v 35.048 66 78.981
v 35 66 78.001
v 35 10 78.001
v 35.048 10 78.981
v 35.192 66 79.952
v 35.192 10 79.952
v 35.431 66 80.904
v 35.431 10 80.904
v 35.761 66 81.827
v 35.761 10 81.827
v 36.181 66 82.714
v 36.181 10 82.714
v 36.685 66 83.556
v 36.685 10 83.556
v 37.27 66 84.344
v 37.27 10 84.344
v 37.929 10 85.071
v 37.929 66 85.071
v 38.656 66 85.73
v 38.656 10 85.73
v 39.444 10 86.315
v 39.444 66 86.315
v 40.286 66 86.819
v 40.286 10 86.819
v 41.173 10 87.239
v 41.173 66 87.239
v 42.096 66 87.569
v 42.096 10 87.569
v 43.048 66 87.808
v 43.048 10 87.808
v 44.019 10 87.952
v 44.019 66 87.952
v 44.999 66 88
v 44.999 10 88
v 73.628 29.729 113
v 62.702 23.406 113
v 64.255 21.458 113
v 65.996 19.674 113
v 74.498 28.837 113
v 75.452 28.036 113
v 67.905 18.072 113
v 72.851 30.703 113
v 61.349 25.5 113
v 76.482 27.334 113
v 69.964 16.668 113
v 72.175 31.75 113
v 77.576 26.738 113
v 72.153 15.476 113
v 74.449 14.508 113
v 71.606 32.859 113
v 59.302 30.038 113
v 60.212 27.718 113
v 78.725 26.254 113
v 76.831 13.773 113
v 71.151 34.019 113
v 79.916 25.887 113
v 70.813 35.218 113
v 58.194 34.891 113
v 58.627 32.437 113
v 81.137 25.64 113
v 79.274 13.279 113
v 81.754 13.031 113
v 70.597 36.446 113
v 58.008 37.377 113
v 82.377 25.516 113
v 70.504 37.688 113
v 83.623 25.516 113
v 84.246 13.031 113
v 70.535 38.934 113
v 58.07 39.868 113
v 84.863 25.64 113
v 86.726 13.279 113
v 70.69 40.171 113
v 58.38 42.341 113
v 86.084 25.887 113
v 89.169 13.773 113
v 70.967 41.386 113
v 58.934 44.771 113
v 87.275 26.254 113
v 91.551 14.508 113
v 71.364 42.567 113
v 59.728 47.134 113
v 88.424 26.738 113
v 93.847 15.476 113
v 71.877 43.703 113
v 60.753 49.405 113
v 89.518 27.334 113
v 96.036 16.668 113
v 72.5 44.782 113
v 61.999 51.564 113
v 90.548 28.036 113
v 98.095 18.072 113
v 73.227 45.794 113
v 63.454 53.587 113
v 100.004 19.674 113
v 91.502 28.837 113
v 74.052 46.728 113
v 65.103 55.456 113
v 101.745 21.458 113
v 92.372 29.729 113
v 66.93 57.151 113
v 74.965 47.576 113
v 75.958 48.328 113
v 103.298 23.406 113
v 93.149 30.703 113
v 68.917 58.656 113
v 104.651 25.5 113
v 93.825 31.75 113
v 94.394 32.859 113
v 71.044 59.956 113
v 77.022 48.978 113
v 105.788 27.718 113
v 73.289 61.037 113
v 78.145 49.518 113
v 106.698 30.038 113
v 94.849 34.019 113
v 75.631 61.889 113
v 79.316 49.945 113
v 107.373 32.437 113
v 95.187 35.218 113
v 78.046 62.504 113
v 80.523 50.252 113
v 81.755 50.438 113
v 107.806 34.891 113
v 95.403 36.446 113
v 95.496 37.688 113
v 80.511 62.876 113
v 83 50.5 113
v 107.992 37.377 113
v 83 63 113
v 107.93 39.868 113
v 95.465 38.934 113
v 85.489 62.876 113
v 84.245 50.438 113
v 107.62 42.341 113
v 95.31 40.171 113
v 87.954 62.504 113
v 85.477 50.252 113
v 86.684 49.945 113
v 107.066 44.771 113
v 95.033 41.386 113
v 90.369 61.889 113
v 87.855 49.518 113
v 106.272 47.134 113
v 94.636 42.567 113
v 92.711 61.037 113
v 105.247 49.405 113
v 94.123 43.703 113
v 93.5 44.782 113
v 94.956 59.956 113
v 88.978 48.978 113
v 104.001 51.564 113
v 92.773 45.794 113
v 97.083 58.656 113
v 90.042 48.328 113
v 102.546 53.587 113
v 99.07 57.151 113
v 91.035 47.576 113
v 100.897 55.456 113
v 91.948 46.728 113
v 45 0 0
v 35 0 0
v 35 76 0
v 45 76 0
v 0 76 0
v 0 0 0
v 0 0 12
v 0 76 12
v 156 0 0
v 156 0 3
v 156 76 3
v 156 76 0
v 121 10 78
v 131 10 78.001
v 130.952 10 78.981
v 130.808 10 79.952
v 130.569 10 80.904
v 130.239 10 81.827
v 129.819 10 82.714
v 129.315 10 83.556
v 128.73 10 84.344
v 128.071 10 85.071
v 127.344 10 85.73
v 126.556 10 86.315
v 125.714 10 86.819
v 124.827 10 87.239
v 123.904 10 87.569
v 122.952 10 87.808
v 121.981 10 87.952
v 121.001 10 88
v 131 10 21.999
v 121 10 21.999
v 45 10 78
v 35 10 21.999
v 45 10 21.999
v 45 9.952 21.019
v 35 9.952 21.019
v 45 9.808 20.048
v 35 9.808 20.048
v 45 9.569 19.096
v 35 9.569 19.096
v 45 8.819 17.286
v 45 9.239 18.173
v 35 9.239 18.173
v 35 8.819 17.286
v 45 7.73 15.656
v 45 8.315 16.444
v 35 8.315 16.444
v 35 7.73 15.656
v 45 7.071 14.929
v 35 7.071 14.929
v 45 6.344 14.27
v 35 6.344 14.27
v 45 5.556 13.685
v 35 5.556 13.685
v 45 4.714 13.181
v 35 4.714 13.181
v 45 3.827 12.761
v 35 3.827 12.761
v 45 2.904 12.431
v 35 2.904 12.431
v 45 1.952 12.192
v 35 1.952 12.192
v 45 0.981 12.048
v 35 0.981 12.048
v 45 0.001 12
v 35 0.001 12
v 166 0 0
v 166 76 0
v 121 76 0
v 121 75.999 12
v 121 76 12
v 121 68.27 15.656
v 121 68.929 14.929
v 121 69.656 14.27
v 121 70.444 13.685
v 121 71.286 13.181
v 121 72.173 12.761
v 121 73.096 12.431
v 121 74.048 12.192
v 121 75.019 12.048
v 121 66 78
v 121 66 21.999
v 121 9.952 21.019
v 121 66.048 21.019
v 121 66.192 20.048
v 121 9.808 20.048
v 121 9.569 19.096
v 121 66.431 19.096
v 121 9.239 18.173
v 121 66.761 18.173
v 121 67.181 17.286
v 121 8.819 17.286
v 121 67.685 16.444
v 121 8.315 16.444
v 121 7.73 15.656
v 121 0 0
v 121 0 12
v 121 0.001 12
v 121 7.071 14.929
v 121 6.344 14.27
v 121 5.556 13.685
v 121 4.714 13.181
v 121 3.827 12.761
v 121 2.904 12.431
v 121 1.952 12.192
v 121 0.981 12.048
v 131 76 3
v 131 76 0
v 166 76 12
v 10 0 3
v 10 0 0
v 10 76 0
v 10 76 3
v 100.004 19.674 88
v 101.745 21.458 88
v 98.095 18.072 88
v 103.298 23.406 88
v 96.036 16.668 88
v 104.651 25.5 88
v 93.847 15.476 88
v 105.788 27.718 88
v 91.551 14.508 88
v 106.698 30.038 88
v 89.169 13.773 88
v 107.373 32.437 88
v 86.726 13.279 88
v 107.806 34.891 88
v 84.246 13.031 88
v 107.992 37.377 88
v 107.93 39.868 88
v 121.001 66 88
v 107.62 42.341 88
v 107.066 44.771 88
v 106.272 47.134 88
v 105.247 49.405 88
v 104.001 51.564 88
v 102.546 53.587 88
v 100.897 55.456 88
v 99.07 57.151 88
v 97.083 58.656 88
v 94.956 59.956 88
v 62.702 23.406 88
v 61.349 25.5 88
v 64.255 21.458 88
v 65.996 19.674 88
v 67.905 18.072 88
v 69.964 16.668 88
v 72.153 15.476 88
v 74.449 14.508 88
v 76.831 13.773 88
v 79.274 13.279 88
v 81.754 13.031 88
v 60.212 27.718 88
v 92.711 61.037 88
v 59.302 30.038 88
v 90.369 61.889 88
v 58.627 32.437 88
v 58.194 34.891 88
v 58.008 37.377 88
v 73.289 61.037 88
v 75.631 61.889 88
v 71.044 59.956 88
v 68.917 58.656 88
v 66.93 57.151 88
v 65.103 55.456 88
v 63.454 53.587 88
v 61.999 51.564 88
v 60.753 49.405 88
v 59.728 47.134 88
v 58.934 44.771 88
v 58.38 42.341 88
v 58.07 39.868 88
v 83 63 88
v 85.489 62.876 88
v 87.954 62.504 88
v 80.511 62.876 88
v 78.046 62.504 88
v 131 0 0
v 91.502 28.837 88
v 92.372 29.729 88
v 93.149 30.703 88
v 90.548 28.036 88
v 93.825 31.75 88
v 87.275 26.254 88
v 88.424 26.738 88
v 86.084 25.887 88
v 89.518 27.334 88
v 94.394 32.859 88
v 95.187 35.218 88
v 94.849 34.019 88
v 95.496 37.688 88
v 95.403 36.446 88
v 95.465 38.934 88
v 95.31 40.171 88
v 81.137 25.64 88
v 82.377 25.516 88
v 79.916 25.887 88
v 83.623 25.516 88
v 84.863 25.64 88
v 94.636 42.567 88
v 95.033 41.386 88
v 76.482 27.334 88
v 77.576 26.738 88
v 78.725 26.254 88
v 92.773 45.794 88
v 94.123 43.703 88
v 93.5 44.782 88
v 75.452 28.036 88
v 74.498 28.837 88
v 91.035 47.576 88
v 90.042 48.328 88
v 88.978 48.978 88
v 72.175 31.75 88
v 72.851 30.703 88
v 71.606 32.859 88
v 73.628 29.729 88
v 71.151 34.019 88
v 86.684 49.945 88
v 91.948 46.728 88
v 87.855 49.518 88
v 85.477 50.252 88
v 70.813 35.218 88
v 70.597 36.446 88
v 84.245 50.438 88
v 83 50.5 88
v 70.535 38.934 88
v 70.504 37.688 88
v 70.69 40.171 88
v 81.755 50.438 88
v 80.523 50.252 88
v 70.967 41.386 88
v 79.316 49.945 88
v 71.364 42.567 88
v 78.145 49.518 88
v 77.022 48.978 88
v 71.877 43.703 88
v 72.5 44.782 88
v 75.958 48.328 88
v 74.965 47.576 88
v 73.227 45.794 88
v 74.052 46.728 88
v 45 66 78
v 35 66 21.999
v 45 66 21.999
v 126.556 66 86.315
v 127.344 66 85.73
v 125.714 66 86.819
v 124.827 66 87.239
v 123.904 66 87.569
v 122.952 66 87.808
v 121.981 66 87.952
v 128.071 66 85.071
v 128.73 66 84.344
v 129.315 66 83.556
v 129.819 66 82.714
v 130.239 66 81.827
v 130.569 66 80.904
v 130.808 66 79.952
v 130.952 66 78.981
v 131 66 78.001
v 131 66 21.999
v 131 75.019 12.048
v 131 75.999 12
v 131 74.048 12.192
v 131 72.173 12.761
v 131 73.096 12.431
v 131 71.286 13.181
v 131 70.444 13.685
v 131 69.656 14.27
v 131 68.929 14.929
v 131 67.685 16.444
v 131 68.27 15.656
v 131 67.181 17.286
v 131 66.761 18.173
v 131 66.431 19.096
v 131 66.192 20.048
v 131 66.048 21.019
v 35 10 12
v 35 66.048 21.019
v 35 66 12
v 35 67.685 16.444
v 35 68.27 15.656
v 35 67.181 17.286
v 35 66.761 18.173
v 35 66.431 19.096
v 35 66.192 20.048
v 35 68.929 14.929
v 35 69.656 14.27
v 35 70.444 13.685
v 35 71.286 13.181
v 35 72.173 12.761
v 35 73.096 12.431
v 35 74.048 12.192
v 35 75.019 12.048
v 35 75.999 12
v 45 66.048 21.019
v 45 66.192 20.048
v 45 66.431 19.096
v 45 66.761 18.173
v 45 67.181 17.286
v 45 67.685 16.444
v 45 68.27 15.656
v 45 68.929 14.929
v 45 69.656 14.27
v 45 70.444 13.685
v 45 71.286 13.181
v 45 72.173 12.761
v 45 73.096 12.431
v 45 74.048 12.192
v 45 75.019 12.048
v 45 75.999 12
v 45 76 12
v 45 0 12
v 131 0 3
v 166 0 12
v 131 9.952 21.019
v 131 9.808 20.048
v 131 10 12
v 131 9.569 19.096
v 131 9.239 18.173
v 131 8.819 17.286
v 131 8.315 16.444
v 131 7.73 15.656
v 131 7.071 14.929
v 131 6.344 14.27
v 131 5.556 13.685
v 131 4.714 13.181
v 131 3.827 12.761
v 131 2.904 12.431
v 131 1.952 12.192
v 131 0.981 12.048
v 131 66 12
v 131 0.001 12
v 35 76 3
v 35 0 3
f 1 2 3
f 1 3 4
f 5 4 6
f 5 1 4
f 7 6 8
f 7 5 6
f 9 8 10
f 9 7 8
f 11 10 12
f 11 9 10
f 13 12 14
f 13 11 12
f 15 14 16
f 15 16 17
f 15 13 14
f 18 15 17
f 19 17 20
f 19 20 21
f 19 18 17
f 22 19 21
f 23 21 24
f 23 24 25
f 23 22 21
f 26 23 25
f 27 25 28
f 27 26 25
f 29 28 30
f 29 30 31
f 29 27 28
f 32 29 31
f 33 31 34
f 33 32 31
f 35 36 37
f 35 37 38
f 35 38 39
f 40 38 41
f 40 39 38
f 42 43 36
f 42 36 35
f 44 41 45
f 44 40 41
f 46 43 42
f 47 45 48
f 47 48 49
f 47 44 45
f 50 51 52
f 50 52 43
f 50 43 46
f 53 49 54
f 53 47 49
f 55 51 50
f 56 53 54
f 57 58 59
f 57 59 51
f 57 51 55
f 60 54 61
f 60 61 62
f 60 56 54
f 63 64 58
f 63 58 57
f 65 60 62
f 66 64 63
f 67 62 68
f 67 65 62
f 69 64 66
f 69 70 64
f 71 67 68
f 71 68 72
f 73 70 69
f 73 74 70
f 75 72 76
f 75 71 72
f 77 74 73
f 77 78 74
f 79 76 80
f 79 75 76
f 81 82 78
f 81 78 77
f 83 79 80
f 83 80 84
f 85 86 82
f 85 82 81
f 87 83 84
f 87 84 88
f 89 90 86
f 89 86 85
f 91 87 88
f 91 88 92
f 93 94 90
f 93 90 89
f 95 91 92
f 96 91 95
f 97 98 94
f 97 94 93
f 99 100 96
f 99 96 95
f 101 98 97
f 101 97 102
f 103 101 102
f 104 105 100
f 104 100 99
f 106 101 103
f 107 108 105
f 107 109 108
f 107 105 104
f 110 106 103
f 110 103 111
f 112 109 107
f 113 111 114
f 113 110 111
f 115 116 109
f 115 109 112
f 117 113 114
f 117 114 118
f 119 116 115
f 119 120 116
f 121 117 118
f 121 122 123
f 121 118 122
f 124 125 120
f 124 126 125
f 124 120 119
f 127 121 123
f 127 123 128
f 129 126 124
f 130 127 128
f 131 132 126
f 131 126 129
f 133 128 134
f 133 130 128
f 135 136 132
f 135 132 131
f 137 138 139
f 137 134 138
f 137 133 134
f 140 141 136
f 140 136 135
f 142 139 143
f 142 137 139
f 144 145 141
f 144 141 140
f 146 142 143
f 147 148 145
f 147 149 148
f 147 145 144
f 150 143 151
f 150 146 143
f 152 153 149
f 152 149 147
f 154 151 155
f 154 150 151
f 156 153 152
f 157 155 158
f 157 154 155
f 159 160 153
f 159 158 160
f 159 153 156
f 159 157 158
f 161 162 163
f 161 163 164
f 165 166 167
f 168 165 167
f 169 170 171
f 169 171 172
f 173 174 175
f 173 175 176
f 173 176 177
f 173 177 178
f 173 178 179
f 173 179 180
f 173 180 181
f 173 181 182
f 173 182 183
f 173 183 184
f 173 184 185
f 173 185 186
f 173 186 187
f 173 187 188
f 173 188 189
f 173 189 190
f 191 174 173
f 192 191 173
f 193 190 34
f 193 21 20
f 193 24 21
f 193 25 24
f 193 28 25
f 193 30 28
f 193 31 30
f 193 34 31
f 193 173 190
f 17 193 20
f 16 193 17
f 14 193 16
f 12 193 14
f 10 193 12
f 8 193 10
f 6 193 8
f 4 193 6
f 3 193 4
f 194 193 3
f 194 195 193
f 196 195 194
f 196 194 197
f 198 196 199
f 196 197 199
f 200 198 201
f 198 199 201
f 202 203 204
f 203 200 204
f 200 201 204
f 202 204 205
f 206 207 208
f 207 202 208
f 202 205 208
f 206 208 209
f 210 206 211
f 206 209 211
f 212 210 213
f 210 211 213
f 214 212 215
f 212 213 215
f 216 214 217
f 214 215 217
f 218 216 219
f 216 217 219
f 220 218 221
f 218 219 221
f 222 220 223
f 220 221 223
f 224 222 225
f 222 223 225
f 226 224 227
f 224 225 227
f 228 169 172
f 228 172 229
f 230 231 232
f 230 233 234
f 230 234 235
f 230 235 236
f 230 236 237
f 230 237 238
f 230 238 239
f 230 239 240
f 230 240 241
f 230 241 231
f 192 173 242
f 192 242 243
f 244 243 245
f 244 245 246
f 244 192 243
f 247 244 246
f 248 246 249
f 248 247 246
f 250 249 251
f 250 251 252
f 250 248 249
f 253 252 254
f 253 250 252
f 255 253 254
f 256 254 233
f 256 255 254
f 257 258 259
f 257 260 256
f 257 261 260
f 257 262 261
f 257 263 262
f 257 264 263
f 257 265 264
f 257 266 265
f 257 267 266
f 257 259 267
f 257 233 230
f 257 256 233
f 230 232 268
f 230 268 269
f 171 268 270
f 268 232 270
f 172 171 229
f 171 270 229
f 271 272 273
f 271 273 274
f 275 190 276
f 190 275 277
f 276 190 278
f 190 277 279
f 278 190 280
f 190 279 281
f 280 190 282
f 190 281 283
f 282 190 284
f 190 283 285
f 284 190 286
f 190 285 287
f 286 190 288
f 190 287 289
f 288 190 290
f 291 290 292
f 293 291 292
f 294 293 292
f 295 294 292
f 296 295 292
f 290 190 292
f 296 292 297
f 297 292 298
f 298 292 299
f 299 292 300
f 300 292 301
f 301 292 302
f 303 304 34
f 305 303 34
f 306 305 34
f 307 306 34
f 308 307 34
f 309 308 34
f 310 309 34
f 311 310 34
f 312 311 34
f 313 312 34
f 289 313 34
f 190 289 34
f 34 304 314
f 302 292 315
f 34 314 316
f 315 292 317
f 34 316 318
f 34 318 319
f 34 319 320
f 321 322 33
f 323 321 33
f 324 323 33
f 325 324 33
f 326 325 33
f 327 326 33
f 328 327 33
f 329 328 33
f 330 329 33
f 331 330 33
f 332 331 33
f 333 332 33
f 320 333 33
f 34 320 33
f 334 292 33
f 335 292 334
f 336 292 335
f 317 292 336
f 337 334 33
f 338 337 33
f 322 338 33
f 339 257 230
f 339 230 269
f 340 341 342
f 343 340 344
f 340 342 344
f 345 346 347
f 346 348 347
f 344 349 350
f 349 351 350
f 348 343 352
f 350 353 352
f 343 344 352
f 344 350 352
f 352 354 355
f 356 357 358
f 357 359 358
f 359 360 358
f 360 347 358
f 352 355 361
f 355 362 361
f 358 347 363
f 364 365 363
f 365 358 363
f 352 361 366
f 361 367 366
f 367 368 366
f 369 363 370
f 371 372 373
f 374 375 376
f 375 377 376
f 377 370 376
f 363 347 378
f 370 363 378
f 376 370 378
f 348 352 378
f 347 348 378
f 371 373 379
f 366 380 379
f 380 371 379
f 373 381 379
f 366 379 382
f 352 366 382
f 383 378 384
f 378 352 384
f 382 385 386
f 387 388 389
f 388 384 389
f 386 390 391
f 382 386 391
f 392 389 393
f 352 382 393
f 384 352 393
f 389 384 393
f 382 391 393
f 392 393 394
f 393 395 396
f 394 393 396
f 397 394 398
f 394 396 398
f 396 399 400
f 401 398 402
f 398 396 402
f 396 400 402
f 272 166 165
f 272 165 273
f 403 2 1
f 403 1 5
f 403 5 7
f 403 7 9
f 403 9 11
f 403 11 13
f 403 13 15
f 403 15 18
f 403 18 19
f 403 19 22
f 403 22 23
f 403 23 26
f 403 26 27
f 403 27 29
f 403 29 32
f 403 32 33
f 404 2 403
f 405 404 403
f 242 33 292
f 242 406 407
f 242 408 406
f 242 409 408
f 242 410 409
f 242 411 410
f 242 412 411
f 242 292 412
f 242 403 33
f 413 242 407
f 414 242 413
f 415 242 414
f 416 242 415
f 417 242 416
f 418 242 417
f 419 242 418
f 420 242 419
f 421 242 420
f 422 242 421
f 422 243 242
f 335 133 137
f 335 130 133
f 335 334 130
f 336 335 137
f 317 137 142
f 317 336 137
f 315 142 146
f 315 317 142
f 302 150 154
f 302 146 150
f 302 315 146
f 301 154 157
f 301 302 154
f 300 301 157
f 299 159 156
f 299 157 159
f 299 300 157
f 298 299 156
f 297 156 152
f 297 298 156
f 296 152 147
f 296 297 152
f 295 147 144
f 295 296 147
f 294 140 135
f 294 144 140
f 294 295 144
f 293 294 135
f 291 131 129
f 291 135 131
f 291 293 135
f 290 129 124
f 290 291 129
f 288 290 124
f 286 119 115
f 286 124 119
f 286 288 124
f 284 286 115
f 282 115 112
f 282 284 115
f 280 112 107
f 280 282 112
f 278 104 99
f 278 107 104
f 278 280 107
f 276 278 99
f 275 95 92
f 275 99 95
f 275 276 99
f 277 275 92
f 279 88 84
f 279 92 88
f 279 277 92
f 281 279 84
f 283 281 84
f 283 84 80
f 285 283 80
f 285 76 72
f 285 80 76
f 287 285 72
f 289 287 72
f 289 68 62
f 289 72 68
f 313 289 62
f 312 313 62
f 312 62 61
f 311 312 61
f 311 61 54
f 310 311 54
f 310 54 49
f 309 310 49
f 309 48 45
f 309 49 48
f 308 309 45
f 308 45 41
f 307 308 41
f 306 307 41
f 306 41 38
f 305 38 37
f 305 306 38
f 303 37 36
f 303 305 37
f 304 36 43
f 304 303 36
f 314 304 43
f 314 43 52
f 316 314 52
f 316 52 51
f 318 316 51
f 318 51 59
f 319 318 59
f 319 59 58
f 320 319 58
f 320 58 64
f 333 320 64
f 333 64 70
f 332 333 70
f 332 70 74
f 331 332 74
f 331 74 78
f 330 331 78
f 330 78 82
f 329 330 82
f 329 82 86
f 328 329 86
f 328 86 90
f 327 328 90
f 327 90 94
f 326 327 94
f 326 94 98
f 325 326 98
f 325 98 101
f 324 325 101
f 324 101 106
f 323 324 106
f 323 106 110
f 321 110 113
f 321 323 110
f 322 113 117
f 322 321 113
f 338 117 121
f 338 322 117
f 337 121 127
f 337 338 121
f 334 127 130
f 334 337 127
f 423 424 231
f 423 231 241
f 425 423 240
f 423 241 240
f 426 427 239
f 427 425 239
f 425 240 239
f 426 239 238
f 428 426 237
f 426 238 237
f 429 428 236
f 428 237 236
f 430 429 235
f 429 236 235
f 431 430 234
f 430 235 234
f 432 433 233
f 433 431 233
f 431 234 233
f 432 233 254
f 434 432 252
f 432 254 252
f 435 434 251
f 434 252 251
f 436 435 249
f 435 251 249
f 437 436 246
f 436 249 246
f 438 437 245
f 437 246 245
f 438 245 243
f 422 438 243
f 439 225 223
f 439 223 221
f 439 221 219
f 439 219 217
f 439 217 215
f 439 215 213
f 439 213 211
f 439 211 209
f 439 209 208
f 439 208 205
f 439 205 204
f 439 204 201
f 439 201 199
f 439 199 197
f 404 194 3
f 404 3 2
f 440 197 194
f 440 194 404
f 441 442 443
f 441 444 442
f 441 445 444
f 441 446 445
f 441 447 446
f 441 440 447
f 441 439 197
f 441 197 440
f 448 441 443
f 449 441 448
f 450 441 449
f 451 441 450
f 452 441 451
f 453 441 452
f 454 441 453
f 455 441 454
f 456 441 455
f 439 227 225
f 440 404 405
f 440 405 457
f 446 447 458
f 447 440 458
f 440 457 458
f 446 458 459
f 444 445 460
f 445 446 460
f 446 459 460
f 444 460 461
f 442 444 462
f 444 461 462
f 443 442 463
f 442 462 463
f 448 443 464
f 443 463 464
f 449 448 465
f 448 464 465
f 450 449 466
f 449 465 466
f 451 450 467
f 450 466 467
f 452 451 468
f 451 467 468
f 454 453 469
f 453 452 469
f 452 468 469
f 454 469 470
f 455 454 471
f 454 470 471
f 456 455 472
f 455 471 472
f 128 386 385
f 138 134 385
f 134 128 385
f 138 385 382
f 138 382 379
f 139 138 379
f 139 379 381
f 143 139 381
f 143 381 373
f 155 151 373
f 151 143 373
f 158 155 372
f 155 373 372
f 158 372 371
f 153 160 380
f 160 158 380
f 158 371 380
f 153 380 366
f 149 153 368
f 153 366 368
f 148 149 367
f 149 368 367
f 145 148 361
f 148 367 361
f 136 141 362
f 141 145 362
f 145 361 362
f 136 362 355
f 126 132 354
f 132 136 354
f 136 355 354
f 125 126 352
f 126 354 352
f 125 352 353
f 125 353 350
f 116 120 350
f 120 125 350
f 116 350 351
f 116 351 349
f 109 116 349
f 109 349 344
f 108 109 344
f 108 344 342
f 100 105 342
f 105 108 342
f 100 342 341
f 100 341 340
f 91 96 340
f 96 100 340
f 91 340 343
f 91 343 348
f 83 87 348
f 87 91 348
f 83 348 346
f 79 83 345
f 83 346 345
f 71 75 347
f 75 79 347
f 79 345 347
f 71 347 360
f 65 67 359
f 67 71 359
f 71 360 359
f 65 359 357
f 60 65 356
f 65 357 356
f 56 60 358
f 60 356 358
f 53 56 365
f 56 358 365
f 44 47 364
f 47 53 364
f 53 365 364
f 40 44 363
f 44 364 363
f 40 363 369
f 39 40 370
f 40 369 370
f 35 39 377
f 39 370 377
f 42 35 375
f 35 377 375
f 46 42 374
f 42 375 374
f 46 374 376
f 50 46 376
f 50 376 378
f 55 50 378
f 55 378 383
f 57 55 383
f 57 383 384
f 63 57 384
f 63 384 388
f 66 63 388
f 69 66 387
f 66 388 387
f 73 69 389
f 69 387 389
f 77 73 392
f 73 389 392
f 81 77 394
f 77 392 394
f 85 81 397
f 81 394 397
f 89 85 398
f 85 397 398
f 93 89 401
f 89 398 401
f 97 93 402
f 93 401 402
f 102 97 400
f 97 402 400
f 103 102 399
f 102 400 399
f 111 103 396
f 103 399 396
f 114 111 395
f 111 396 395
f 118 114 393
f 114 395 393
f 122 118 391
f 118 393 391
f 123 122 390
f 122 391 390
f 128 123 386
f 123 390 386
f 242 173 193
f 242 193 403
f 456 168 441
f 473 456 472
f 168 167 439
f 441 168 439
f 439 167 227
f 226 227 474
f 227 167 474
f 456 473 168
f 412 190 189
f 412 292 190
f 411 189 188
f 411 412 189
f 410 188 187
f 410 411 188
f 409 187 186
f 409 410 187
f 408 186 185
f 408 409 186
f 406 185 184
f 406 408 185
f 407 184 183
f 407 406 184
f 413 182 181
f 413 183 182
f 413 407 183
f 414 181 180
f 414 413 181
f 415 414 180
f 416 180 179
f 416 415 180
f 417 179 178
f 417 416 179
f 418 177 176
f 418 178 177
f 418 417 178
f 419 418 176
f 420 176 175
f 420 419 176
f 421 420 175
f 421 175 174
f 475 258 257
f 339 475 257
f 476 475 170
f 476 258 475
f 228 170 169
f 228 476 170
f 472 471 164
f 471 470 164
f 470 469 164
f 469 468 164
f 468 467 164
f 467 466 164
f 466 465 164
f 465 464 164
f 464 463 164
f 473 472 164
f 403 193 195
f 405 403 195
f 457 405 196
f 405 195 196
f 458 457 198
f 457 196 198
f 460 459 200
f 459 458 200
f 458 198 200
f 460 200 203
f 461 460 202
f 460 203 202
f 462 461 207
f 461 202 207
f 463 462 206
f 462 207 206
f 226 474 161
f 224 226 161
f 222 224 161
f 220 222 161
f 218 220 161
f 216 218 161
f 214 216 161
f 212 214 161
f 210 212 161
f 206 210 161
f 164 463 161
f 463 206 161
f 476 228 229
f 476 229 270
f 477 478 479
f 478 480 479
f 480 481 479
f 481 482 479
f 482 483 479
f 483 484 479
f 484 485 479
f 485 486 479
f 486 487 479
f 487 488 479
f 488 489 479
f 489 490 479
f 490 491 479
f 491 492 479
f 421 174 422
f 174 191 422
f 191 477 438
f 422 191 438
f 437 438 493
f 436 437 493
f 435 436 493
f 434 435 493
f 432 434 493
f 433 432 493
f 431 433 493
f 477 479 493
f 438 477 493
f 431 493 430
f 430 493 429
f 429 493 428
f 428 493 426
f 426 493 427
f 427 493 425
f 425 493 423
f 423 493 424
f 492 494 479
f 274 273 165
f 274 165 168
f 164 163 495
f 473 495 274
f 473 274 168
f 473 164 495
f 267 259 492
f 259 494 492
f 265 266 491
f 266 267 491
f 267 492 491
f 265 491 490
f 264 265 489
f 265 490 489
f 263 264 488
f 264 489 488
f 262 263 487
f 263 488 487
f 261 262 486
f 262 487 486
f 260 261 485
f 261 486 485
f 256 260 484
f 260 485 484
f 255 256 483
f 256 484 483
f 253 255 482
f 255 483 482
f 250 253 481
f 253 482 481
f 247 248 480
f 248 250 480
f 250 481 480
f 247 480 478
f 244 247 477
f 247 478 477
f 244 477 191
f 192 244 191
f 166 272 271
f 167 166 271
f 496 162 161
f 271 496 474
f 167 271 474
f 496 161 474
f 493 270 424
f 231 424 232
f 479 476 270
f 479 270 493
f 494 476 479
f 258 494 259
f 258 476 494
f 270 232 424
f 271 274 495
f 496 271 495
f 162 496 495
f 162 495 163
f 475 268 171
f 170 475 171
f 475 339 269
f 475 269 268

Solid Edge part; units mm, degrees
sketch "Sketch1" plane through (0, 0, 0) normal (0, -1, 0) x (1, 0, 0)
  line L0 (0, 12) -> (45, 12)
  line L1 (45, 12) -> (45, 0)
  line L2 (35, 0) -> (45, 0)
  line L3 (35, 3) -> (35, 0)
  line L4 (10, 3) -> (35, 3)
  line L5 (10, 0) -> (10, 3)
  line L6 (0, 0) -> (10, 0)
  line L7 (0, 0) -> (0, 12)
  line L8 (166, 12) -> (121, 12)
  line L9 (121, 12) -> (121, 0)
  line L10 (121, 0) -> (131, 0)
  line L11 (131, 0) -> (131, 3)
  line L12 (131, 3) -> (156, 3)
  line L13 (156, 3) -> (156, 0)
  line L14 (156, 0) -> (166, 0)
  line L15 (166, 0) -> (166, 12)
extrude "Protrusion1" add sketch "Sketch1" against normal blind 76
sketch "Sketch2" plane through (143.5, 38, 12) normal (0, 0, 1) x (1, 0, 0)
  line L0 (-12.5, -28) -> (-12.5, 28)
  line L1 (-12.5, 28) -> (-22.5, 28)
  line L2 (-22.5, 28) -> (-22.5, -28)
  line L3 (-22.5, -28) -> (-12.5, -28)
  line L4 (-108.5, -28) -> (-108.5, 28)
  line L5 (-108.5, 28) -> (-98.5, 28)
  line L6 (-98.5, 28) -> (-98.5, -28)
  line L7 (-98.5, -28) -> (-108.5, -28)
extrude "ExtrudedProtrusion_2" add sketch "Sketch2" along normal blind 76
sketch "Sketch3" plane through (131, 38, 50) normal (1, 0, 0) x (0, 1, 0)
  line L0 (28, 38) -> (-28, 38)
  line L1 (-28, 38) -> (-28, 28)
  line L2 (-28, 28) -> (28, 28)
  line L3 (28, 28) -> (28, 38)
extrude "ExtrudedProtrusion_3" add sketch "Sketch3" against normal blind 96
sketch "Sketch4" plane through (83, 38, 88) normal (0, 0, 1) x (0, 1, 0)
  circle A0 centre (0, 0) radius 12.5
  circle A1 centre (0, 0) radius 25
extrude "ExtrudedProtrusion_4" add sketch "Sketch4" along normal blind 25
fillet "Round_1" radius 10 6 edges at (131, 38, 88) (126, 66, 12) (40, 66, 12) (35, 38, 88) (40, 10, 12) (126, 10, 12)
